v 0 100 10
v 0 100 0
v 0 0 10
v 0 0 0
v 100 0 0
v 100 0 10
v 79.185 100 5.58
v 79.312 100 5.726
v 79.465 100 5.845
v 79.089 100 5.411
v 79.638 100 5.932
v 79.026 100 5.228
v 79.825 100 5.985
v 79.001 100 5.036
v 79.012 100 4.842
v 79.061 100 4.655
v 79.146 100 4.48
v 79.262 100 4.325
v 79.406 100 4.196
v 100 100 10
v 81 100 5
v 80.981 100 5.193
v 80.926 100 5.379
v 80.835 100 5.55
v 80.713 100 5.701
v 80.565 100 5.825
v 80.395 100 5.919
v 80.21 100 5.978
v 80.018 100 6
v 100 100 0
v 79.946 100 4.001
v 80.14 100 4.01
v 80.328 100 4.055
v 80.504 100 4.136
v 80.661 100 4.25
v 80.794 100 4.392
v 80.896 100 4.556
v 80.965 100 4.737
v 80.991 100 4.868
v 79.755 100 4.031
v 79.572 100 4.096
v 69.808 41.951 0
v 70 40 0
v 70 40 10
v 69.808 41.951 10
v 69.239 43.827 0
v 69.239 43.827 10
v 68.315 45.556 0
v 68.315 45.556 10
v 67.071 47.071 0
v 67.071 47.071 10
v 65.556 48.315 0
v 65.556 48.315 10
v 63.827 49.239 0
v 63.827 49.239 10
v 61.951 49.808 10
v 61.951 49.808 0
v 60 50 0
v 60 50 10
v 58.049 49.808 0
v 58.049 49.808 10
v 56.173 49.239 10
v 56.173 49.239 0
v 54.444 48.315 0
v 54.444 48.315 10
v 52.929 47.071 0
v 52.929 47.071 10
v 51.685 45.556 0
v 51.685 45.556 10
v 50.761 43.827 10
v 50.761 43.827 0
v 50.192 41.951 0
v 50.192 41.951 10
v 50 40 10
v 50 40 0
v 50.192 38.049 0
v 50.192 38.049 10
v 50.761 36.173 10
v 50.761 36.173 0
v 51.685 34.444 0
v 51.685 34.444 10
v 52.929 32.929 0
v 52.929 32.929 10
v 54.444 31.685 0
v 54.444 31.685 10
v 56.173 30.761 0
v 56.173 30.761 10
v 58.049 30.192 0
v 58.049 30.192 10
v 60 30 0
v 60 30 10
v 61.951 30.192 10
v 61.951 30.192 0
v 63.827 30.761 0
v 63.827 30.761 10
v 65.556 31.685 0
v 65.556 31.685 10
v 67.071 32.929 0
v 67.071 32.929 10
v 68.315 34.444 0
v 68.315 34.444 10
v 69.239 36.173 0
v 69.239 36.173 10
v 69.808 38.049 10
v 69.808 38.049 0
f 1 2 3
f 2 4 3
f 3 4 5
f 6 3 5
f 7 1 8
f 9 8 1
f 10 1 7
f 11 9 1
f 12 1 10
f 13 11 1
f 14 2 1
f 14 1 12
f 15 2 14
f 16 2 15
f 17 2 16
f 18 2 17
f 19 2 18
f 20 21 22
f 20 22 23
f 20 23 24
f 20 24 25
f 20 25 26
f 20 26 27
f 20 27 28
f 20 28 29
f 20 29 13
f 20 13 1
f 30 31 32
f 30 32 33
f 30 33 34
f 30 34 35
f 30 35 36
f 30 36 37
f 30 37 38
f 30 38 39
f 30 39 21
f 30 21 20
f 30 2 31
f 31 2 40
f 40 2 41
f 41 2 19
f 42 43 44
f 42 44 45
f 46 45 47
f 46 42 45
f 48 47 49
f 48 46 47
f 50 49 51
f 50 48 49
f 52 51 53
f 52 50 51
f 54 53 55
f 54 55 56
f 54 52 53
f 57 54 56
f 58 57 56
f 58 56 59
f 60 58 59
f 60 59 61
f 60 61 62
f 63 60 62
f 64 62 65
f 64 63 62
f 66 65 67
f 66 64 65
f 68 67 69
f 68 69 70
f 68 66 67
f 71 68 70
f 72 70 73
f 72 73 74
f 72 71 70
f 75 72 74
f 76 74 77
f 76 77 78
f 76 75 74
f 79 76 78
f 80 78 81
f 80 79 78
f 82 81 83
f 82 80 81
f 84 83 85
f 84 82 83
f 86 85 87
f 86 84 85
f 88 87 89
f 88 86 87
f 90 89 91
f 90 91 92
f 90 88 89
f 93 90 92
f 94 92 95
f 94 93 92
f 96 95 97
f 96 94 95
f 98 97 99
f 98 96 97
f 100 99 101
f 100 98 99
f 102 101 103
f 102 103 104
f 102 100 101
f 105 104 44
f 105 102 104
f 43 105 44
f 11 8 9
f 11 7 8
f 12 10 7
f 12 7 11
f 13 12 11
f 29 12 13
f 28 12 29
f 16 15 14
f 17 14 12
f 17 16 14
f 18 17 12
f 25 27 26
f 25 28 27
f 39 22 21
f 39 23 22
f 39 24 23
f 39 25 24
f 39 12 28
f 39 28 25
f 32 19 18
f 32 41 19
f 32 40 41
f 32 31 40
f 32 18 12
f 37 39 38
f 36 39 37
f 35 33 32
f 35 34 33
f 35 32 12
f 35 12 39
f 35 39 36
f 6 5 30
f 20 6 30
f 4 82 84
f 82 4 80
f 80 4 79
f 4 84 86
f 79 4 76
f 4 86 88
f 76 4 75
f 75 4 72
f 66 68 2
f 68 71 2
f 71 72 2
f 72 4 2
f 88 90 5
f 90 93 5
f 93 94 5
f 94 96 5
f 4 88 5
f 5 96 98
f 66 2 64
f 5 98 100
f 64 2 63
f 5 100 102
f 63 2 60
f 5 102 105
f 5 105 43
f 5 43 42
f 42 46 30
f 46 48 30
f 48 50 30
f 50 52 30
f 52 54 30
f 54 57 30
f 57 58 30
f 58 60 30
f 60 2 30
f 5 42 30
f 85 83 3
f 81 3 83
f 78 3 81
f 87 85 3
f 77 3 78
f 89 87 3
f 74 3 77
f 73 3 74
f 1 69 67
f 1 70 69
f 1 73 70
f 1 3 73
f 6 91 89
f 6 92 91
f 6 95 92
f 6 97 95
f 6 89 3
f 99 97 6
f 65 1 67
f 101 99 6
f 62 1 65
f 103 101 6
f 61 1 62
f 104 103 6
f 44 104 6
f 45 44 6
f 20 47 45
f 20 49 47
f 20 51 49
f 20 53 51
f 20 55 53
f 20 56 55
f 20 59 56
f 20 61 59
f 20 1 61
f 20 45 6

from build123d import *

# Parameters (mm, degrees)
SKETCH_W    = 100
SKETCH_H    = 100
SKETCH_R    = 10
PAD_DEPTH   = 10
SKETCH002_R = 1


with BuildPart() as part:
    # Sketch → Pad (new body)
    with BuildSketch(Plane.XY):
        with Locations((50, 50)):
            Rectangle(SKETCH_W, SKETCH_H)
        with Locations((60, 40)):
            Circle(SKETCH_R, mode=Mode.SUBTRACT)
    extrude(amount=PAD_DEPTH)

    # SubtractivePipe: sweep along a path in Sketch001
    with BuildLine(Plane.XY.offset(5)) as subtractivepipe_path:
        Line((-10, 20), (60, 20))
        ThreePointArc((60, 20), (74.142136, 25.857864), (80, 40))
        Line((80, 40), (80, 110))
    # Sketch002 → SubtractivePipe (sweep, cut)
    with BuildSketch(Plane(origin=(0, 0, 5), x_dir=(0, 1, 0), z_dir=(1, 0, 0))):
        with Locations((20, 0)):
            Circle(SKETCH002_R)
    sweep(path=subtractivepipe_path.line, mode=Mode.SUBTRACT)

    # AdditivePipe: sweep along a path in Sketch005
    with BuildLine(Plane.XY.offset(5)) as additivepipe_path:
        Line((0, 20), (60, 20))
        ThreePointArc((60, 20), (74.142136, 25.857864), (80, 40))
        Line((80, 40), (80, 100))
    # Sketch006 → AdditivePipe (sweep)
    with BuildSketch(Plane(origin=(0, 20, 5), x_dir=(0, 1, 0), z_dir=(1, 0, 0))):
        with BuildLine():
            ThreePointArc((0, -1), (0.707107, -0.707107), (1, 0))
            Line((1, 0), (0, 0))
            Line((0, 0), (0, -1))
        make_face()
    sweep(path=additivepipe_path.line)

    # AdditivePipe001: sweep along a path in Sketch011
    with BuildLine(Plane.XY.offset(5)) as additivepipe001_path:
        Line((0, 20), (60, 20))
        ThreePointArc((60, 20), (74.142136, 25.857864), (80, 40))
        Line((80, 40), (80, 100))
    # Sketch012 → AdditivePipe001 (sweep)
    with BuildSketch(Plane(origin=(0, 20, 5), x_dir=(0, 0, 1), z_dir=(1, 0, 0))):
        with BuildLine():
            ThreePointArc((0, -1), (0.707107, -0.707107), (1, 0))
            Line((1, 0), (0, 0))
            Line((0, 0), (0, -1))
        make_face()
    sweep(path=additivepipe001_path.line)

    # AdditivePipe002: sweep along a path in Sketch016
    with BuildLine(Plane.XY.offset(5)) as additivepipe002_path:
        Line((0, 20), (60, 20))
        ThreePointArc((60, 20), (74.142136, 25.857864), (80, 40))
        Line((80, 40), (80, 100))
    # Sketch015 → AdditivePipe002 (sweep)
    with BuildSketch(Plane(origin=(0, 20, 5), x_dir=(0, 0, -1), z_dir=(1, 0, 0))):
        with BuildLine():
            ThreePointArc((0, -1), (0.707107, -0.707107), (1, 0))
            Line((1, 0), (0, 0))
            Line((0, 0), (0, -1))
        make_face()
    sweep(path=additivepipe002_path.line)

    # AdditivePipe003: sweep along a path in Sketch013
    with BuildLine(Plane.XY.offset(5)) as additivepipe003_path:
        Line((0, 20), (60, 20))
        ThreePointArc((60, 20), (74.142136, 25.857864), (80, 40))
        Line((80, 40), (80, 100))
    # Sketch014 → AdditivePipe003 (sweep)
    with BuildSketch(Plane(origin=(0, 20, 5), x_dir=(0, -1, 0), z_dir=(1, 0, 0))):
        with BuildLine():
            ThreePointArc((0, -1), (0.707107, -0.707107), (1, 0))
            Line((1, 0), (0, 0))
            Line((0, 0), (0, -1))
        make_face()
    sweep(path=additivepipe003_path.line)


solid = part.part
